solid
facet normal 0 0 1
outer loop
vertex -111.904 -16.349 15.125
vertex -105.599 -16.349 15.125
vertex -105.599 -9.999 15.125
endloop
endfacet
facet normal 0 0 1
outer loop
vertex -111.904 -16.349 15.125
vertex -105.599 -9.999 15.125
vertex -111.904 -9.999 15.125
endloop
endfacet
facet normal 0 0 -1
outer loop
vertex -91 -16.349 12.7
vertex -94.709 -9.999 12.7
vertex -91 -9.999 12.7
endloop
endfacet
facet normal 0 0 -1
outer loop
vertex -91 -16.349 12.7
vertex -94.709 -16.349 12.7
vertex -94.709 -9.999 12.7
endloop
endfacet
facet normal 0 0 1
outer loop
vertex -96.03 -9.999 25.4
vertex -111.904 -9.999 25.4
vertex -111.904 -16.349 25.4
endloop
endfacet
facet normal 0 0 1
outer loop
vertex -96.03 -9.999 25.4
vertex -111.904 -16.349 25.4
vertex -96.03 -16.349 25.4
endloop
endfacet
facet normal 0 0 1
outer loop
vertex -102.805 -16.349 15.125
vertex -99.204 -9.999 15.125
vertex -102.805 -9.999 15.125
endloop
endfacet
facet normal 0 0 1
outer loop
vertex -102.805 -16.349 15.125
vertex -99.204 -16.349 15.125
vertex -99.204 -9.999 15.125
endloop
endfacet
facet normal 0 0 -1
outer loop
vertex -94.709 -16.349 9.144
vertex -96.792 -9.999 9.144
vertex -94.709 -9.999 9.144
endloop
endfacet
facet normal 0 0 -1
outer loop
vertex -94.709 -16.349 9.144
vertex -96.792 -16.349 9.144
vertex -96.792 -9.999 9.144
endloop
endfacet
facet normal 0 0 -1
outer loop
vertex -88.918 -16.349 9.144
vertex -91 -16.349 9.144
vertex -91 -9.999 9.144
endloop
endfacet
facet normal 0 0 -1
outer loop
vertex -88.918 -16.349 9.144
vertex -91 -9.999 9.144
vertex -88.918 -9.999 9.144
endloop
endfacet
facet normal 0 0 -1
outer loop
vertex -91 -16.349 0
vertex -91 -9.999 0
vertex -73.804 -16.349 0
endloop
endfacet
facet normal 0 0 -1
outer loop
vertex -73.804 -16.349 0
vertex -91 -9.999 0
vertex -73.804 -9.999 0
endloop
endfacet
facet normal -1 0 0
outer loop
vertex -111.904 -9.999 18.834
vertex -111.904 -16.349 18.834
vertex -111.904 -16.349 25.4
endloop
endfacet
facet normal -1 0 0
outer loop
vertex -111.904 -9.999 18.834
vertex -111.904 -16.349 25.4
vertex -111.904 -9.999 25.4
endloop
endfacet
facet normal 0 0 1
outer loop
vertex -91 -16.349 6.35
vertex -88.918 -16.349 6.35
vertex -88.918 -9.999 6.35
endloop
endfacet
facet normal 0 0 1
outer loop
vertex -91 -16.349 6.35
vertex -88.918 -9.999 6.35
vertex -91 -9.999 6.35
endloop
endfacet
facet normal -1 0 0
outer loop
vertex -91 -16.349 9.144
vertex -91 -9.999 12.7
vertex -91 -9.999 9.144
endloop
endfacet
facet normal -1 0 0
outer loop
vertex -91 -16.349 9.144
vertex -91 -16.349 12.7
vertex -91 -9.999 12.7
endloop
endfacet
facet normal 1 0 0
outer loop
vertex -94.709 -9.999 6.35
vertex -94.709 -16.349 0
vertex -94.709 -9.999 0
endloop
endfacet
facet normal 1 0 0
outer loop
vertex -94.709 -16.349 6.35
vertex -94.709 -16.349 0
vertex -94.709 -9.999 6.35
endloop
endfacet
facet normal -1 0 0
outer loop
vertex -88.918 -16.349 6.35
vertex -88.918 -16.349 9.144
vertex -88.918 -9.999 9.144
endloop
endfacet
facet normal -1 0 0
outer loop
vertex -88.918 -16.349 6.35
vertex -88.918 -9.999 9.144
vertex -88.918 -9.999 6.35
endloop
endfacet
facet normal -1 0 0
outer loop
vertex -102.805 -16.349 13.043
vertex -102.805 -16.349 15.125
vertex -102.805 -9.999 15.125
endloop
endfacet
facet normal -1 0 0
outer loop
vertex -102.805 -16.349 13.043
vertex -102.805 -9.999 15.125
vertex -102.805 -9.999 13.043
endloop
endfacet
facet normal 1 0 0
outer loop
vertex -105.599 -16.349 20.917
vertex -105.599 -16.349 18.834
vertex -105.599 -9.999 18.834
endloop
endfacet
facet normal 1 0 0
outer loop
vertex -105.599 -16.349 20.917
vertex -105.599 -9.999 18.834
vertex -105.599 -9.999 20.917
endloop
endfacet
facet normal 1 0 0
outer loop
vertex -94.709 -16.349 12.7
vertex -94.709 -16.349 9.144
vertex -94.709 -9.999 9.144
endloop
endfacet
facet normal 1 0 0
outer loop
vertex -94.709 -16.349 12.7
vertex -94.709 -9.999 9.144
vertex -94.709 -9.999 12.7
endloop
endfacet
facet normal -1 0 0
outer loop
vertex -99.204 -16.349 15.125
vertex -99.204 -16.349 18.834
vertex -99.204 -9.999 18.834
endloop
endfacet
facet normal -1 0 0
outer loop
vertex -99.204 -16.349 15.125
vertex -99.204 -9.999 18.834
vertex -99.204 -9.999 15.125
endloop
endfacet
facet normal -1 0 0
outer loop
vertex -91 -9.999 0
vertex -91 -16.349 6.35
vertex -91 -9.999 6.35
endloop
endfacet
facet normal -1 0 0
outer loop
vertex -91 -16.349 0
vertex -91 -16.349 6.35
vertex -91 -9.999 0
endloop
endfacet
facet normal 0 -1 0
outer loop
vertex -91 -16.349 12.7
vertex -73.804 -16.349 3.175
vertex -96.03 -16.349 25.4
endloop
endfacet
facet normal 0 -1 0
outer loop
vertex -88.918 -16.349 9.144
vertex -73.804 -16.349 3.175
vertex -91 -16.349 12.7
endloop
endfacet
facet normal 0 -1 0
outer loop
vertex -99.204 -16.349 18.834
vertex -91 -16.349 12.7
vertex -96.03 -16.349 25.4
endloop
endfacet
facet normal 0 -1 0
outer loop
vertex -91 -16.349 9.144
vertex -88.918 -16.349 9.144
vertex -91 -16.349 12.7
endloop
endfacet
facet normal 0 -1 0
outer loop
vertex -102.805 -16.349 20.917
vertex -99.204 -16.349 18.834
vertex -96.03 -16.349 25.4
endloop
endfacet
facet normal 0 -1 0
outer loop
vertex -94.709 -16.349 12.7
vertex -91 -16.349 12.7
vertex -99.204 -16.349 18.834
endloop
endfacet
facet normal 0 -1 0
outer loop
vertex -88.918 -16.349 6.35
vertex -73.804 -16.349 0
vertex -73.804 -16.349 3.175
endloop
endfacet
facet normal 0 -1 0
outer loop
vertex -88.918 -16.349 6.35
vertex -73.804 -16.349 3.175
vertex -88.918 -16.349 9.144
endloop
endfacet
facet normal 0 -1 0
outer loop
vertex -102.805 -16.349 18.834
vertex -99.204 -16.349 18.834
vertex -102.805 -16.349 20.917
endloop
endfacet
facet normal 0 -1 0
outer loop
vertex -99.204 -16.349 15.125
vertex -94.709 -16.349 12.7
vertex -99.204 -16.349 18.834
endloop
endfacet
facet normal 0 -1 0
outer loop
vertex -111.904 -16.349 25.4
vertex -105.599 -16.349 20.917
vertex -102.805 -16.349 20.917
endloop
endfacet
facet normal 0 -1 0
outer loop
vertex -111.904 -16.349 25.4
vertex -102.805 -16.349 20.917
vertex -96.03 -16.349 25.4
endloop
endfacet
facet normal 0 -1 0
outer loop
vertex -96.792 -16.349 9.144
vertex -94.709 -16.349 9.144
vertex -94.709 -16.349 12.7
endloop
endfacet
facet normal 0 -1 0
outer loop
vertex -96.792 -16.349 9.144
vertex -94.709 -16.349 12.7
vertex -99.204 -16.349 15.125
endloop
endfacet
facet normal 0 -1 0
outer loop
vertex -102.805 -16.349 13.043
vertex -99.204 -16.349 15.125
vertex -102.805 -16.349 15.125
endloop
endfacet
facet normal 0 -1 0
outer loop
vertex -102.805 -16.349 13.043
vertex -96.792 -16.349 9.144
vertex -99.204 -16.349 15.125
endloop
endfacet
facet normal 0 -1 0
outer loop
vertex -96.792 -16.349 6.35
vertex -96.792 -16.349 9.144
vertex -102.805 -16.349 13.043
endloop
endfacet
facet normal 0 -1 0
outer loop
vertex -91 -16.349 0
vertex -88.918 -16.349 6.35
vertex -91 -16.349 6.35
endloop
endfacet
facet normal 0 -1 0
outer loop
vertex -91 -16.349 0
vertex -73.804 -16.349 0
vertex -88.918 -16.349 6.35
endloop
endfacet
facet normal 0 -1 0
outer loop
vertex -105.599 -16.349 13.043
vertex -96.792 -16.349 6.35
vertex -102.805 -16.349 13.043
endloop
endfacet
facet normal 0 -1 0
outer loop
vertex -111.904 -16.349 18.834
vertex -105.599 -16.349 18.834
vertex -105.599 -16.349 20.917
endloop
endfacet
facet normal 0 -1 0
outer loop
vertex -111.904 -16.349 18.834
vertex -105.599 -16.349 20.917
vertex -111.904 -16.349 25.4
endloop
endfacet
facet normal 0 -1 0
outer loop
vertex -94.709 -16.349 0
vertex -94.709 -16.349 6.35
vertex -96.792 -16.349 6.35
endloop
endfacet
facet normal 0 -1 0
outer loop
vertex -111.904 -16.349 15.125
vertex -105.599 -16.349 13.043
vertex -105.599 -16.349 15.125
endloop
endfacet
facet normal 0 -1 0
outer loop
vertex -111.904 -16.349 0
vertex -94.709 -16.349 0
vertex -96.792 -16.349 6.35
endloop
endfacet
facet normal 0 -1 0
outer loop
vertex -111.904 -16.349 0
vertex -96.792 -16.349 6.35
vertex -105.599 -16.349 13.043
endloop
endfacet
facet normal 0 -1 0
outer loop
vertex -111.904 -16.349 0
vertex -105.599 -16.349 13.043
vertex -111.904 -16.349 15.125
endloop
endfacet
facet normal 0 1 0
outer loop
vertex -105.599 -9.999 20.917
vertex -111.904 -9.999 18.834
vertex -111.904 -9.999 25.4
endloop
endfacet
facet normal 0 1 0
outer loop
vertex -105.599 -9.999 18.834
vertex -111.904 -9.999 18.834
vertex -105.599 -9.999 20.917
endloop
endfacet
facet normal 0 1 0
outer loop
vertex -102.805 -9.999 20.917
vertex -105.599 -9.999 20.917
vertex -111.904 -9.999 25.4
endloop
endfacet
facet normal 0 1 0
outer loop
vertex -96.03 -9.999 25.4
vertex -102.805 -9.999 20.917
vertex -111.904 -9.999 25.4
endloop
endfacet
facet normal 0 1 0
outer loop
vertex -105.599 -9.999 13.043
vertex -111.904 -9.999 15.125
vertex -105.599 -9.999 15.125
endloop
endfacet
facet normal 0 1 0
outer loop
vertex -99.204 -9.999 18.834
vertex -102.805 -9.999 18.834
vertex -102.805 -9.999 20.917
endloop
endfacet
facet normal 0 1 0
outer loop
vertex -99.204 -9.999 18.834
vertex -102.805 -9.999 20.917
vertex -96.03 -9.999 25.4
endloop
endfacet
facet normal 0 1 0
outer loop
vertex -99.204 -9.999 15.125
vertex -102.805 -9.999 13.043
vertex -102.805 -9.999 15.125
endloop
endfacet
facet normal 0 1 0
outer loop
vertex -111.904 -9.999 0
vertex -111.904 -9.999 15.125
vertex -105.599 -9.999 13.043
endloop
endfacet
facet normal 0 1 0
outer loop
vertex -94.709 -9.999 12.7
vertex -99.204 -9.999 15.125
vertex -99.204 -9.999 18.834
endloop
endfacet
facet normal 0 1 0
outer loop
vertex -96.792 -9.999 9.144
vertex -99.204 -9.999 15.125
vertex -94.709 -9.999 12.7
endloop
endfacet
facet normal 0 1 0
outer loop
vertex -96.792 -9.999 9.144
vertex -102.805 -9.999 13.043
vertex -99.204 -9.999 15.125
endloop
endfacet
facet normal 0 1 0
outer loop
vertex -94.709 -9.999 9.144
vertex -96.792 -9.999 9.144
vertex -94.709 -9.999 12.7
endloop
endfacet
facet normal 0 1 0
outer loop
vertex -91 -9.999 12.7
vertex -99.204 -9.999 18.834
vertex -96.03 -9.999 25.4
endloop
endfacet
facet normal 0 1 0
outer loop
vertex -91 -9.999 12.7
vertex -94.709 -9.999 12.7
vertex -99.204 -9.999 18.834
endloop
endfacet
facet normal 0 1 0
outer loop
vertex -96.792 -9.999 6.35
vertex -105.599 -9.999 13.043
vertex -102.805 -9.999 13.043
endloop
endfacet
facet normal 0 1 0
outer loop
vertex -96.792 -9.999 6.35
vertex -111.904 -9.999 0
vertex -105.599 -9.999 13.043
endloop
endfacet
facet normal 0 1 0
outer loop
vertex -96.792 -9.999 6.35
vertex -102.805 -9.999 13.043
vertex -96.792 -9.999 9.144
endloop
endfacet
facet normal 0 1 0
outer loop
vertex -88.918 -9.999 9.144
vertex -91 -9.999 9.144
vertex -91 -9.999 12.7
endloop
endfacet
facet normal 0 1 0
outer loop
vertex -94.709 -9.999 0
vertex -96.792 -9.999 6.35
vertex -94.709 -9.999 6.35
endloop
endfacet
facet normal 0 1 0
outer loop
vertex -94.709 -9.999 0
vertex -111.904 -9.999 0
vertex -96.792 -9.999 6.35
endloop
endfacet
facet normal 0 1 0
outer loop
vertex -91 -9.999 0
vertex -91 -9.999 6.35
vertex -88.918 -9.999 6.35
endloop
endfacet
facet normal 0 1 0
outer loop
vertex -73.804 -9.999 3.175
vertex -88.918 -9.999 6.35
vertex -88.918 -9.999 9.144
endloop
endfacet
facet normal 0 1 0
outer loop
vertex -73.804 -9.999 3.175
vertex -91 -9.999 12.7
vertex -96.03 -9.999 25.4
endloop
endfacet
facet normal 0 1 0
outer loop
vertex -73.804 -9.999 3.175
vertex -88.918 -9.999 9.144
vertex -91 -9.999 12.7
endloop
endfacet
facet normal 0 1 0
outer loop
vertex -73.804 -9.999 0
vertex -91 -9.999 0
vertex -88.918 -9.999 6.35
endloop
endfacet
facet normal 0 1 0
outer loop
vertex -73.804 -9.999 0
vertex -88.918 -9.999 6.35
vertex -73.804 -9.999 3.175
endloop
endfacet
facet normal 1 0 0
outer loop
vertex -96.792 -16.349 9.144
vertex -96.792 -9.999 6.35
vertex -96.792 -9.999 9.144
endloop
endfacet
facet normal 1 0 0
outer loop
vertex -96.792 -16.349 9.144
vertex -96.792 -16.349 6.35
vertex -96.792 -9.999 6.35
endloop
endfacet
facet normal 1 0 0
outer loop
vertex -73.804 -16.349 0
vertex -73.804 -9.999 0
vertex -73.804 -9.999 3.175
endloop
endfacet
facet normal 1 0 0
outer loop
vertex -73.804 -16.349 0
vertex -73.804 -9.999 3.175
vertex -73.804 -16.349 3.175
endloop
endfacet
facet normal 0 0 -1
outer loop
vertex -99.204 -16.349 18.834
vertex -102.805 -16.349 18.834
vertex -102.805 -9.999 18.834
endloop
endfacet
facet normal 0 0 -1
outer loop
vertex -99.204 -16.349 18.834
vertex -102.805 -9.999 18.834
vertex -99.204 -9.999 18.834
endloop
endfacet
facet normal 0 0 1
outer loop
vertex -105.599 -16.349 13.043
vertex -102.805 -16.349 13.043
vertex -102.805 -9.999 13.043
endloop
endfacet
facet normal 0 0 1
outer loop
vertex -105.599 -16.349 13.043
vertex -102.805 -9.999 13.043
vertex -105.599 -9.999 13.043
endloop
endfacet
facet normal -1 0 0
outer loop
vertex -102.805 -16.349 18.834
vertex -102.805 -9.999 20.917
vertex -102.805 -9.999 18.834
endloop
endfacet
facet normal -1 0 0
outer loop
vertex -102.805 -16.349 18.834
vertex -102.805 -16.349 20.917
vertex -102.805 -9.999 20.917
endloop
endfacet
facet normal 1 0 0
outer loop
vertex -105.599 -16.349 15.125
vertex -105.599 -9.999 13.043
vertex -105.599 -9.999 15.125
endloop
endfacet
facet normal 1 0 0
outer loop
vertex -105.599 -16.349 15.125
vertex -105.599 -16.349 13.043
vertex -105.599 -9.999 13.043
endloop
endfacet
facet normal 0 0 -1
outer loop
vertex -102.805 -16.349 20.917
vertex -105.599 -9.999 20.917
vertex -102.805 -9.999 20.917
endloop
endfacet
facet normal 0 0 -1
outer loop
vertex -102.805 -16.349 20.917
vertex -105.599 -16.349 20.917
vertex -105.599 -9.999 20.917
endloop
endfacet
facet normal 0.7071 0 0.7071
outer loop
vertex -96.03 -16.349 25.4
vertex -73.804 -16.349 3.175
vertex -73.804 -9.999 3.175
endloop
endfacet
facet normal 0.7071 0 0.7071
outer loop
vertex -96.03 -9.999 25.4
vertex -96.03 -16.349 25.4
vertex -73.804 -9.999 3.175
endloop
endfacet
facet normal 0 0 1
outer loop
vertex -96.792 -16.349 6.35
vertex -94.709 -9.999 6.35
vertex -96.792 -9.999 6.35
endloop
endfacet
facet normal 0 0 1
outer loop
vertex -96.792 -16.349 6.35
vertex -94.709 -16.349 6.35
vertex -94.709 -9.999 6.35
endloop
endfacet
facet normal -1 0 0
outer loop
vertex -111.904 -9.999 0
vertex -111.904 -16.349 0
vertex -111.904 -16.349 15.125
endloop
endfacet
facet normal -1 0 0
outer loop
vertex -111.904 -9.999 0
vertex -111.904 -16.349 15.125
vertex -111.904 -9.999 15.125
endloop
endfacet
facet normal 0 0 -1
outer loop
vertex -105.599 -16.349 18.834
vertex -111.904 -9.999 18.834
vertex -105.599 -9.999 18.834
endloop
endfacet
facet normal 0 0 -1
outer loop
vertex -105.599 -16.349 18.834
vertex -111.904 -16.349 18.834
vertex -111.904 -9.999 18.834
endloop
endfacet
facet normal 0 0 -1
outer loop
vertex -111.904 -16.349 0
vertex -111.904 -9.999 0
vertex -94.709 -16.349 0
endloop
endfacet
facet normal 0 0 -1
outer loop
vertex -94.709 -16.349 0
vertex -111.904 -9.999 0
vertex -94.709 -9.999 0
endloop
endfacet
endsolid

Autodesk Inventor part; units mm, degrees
ref_plane "YZ Plane" through (0, 0, 0) normal (1, 0, 0) x (0, 1, 0)
ref_plane "XZ Plane" through (0, 0, 0) normal (0, 1, 0) x (-1, 0, 0)
ref_plane "Work Plane1" through (0, 0, 0) normal (0, 0, 1) x (1, 0, 0)
sketch "Sketch1" plane through (0, 0, 0) normal (0, 0, 1) x (1, 0, 0)
  line L0 (41.9864, 2.5) -> (43.4368, -2.0363) construction
  arc A0 (41.9864, 2.5) -> (43.4368, -2.0363) centre (41.9864, 0) ccw construction
  line L1 (112.0586, -28.575) -> (85.0037, -28.575) construction
  line L2 (112.0586, 28.1043) -> (112.0586, -28.575) construction
  line L3 (83.2959, 28.1043) -> (112.0586, 28.1043) construction
  arc A1 (83.2959, 28.1043) -> (1.0011, 28.575) centre (41.9864, 0) ccw construction
  line L4 (-116.5414, 28.575) -> (1.0011, 28.575) construction
  line L5 (-116.5414, -29.0493) -> (-116.5414, 28.575) construction
  line L6 (-0.7121, -29.0493) -> (-116.5414, -29.0493) construction
  arc A2 (-0.7121, -29.0493) -> (85.0037, -28.575) centre (41.9864, 0) ccw construction
  line L7 (-110.1914, 28.575) -> (-110.1914, 24.0792) construction
  line L8 (-111.9045, -9.9993) -> (-73.8045, -9.9993)
  line L9 (-73.8045, -9.9993) -> (-73.8045, -16.3493)
  line L10 (-73.8045, -16.3493) -> (-111.9045, -16.3493)
  line L11 (-111.9045, -16.3493) -> (-111.9045, -9.9993)
  circle A3 centre (88.3718, 12.2257) radius 1.8542 projected
  circle A4 centre (108.8836, -22.6993) radius 1.8542 projected
  circle A5 centre (-92.8545, -12.7) radius 1.8542 projected
  circle A6 centre (-113.3664, 22.225) radius 1.8542 projected
  circle A7 centre (-92.8545, 12.2257) radius 1.8542 projected
  circle A8 centre (-113.3664, -22.6993) radius 1.8542 projected
  circle A9 centre (88.3718, -12.7) radius 1.8542 projected
  circle A10 centre (108.8836, 22.225) radius 1.8542 projected
  point P0 (0, 0)
  dimension "d0" = 38.1
  dimension "d1" = 6.35
  dimension "d2" = 12.7
extrude "Extrusion1" add sketch "Sketch1" along normal blind 25.4 contours L8 L9 L10 L11 | A5
chamfer "Chamfer1" distance 22.225 angle 45 1 edges at (-73.8045, -13.1743, 25.4)
sketch "Sketch2" plane through (-111.9045, -16.3493, 0) normal (0, -1, 0) x (1, 0, 0)
  line L0 (38.1, 0) -> (0, 0) projected
  line L1 (17.1958, 0) -> (20.9042, 0) projected
  line L2 (19.05, 12.7239) -> (19.05, -0.6753) construction
  line L3 (17.1958, 12.7) -> (20.9042, 12.7)
  line L4 (20.9042, 12.7) -> (20.9042, 0)
  line L5 (20.9042, 0) -> (17.1958, 0)
  line L6 (17.1958, 0) -> (17.1958, 12.7)
  line L7 (15.113, 9.144) -> (22.987, 9.144)
  line L8 (22.987, 9.144) -> (22.987, 6.35)
  line L9 (22.987, 6.35) -> (15.113, 6.35)
  line L10 (15.113, 6.35) -> (15.113, 9.144)
  line L11 (0, 0) -> (0, 25.4) projected
  line L12 (12.7, 18.8338) -> (12.7, 15.1254)
  line L13 (12.7, 15.1254) -> (0, 15.1254)
  line L14 (0, 18.8338) -> (12.7, 18.8338)
  line L15 (9.0991, 20.9166) -> (9.0991, 13.0426)
  line L16 (9.0991, 13.0426) -> (6.3051, 13.0426)
  line L17 (6.3051, 13.0426) -> (6.3051, 20.9166)
  line L18 (6.3051, 20.9166) -> (9.0991, 20.9166)
  point P0 (111.9045, 0)
  dimension "d8" = 7.874
  dimension "d9" = 2.794
  dimension "d10" = 3.937
  dimension "d11" = 3.937
  dimension "d12" = 1.9733
  dimension "d13" = 1.9733
  dimension "d14" = 6.35
  dimension "d15" = 12.7
extrude "Extrusion2" cut sketch "Sketch2" against normal through all
equation "\"d10\" = d11"
equation "\"d13\" = d12"
properties part number "cornerBrace"
